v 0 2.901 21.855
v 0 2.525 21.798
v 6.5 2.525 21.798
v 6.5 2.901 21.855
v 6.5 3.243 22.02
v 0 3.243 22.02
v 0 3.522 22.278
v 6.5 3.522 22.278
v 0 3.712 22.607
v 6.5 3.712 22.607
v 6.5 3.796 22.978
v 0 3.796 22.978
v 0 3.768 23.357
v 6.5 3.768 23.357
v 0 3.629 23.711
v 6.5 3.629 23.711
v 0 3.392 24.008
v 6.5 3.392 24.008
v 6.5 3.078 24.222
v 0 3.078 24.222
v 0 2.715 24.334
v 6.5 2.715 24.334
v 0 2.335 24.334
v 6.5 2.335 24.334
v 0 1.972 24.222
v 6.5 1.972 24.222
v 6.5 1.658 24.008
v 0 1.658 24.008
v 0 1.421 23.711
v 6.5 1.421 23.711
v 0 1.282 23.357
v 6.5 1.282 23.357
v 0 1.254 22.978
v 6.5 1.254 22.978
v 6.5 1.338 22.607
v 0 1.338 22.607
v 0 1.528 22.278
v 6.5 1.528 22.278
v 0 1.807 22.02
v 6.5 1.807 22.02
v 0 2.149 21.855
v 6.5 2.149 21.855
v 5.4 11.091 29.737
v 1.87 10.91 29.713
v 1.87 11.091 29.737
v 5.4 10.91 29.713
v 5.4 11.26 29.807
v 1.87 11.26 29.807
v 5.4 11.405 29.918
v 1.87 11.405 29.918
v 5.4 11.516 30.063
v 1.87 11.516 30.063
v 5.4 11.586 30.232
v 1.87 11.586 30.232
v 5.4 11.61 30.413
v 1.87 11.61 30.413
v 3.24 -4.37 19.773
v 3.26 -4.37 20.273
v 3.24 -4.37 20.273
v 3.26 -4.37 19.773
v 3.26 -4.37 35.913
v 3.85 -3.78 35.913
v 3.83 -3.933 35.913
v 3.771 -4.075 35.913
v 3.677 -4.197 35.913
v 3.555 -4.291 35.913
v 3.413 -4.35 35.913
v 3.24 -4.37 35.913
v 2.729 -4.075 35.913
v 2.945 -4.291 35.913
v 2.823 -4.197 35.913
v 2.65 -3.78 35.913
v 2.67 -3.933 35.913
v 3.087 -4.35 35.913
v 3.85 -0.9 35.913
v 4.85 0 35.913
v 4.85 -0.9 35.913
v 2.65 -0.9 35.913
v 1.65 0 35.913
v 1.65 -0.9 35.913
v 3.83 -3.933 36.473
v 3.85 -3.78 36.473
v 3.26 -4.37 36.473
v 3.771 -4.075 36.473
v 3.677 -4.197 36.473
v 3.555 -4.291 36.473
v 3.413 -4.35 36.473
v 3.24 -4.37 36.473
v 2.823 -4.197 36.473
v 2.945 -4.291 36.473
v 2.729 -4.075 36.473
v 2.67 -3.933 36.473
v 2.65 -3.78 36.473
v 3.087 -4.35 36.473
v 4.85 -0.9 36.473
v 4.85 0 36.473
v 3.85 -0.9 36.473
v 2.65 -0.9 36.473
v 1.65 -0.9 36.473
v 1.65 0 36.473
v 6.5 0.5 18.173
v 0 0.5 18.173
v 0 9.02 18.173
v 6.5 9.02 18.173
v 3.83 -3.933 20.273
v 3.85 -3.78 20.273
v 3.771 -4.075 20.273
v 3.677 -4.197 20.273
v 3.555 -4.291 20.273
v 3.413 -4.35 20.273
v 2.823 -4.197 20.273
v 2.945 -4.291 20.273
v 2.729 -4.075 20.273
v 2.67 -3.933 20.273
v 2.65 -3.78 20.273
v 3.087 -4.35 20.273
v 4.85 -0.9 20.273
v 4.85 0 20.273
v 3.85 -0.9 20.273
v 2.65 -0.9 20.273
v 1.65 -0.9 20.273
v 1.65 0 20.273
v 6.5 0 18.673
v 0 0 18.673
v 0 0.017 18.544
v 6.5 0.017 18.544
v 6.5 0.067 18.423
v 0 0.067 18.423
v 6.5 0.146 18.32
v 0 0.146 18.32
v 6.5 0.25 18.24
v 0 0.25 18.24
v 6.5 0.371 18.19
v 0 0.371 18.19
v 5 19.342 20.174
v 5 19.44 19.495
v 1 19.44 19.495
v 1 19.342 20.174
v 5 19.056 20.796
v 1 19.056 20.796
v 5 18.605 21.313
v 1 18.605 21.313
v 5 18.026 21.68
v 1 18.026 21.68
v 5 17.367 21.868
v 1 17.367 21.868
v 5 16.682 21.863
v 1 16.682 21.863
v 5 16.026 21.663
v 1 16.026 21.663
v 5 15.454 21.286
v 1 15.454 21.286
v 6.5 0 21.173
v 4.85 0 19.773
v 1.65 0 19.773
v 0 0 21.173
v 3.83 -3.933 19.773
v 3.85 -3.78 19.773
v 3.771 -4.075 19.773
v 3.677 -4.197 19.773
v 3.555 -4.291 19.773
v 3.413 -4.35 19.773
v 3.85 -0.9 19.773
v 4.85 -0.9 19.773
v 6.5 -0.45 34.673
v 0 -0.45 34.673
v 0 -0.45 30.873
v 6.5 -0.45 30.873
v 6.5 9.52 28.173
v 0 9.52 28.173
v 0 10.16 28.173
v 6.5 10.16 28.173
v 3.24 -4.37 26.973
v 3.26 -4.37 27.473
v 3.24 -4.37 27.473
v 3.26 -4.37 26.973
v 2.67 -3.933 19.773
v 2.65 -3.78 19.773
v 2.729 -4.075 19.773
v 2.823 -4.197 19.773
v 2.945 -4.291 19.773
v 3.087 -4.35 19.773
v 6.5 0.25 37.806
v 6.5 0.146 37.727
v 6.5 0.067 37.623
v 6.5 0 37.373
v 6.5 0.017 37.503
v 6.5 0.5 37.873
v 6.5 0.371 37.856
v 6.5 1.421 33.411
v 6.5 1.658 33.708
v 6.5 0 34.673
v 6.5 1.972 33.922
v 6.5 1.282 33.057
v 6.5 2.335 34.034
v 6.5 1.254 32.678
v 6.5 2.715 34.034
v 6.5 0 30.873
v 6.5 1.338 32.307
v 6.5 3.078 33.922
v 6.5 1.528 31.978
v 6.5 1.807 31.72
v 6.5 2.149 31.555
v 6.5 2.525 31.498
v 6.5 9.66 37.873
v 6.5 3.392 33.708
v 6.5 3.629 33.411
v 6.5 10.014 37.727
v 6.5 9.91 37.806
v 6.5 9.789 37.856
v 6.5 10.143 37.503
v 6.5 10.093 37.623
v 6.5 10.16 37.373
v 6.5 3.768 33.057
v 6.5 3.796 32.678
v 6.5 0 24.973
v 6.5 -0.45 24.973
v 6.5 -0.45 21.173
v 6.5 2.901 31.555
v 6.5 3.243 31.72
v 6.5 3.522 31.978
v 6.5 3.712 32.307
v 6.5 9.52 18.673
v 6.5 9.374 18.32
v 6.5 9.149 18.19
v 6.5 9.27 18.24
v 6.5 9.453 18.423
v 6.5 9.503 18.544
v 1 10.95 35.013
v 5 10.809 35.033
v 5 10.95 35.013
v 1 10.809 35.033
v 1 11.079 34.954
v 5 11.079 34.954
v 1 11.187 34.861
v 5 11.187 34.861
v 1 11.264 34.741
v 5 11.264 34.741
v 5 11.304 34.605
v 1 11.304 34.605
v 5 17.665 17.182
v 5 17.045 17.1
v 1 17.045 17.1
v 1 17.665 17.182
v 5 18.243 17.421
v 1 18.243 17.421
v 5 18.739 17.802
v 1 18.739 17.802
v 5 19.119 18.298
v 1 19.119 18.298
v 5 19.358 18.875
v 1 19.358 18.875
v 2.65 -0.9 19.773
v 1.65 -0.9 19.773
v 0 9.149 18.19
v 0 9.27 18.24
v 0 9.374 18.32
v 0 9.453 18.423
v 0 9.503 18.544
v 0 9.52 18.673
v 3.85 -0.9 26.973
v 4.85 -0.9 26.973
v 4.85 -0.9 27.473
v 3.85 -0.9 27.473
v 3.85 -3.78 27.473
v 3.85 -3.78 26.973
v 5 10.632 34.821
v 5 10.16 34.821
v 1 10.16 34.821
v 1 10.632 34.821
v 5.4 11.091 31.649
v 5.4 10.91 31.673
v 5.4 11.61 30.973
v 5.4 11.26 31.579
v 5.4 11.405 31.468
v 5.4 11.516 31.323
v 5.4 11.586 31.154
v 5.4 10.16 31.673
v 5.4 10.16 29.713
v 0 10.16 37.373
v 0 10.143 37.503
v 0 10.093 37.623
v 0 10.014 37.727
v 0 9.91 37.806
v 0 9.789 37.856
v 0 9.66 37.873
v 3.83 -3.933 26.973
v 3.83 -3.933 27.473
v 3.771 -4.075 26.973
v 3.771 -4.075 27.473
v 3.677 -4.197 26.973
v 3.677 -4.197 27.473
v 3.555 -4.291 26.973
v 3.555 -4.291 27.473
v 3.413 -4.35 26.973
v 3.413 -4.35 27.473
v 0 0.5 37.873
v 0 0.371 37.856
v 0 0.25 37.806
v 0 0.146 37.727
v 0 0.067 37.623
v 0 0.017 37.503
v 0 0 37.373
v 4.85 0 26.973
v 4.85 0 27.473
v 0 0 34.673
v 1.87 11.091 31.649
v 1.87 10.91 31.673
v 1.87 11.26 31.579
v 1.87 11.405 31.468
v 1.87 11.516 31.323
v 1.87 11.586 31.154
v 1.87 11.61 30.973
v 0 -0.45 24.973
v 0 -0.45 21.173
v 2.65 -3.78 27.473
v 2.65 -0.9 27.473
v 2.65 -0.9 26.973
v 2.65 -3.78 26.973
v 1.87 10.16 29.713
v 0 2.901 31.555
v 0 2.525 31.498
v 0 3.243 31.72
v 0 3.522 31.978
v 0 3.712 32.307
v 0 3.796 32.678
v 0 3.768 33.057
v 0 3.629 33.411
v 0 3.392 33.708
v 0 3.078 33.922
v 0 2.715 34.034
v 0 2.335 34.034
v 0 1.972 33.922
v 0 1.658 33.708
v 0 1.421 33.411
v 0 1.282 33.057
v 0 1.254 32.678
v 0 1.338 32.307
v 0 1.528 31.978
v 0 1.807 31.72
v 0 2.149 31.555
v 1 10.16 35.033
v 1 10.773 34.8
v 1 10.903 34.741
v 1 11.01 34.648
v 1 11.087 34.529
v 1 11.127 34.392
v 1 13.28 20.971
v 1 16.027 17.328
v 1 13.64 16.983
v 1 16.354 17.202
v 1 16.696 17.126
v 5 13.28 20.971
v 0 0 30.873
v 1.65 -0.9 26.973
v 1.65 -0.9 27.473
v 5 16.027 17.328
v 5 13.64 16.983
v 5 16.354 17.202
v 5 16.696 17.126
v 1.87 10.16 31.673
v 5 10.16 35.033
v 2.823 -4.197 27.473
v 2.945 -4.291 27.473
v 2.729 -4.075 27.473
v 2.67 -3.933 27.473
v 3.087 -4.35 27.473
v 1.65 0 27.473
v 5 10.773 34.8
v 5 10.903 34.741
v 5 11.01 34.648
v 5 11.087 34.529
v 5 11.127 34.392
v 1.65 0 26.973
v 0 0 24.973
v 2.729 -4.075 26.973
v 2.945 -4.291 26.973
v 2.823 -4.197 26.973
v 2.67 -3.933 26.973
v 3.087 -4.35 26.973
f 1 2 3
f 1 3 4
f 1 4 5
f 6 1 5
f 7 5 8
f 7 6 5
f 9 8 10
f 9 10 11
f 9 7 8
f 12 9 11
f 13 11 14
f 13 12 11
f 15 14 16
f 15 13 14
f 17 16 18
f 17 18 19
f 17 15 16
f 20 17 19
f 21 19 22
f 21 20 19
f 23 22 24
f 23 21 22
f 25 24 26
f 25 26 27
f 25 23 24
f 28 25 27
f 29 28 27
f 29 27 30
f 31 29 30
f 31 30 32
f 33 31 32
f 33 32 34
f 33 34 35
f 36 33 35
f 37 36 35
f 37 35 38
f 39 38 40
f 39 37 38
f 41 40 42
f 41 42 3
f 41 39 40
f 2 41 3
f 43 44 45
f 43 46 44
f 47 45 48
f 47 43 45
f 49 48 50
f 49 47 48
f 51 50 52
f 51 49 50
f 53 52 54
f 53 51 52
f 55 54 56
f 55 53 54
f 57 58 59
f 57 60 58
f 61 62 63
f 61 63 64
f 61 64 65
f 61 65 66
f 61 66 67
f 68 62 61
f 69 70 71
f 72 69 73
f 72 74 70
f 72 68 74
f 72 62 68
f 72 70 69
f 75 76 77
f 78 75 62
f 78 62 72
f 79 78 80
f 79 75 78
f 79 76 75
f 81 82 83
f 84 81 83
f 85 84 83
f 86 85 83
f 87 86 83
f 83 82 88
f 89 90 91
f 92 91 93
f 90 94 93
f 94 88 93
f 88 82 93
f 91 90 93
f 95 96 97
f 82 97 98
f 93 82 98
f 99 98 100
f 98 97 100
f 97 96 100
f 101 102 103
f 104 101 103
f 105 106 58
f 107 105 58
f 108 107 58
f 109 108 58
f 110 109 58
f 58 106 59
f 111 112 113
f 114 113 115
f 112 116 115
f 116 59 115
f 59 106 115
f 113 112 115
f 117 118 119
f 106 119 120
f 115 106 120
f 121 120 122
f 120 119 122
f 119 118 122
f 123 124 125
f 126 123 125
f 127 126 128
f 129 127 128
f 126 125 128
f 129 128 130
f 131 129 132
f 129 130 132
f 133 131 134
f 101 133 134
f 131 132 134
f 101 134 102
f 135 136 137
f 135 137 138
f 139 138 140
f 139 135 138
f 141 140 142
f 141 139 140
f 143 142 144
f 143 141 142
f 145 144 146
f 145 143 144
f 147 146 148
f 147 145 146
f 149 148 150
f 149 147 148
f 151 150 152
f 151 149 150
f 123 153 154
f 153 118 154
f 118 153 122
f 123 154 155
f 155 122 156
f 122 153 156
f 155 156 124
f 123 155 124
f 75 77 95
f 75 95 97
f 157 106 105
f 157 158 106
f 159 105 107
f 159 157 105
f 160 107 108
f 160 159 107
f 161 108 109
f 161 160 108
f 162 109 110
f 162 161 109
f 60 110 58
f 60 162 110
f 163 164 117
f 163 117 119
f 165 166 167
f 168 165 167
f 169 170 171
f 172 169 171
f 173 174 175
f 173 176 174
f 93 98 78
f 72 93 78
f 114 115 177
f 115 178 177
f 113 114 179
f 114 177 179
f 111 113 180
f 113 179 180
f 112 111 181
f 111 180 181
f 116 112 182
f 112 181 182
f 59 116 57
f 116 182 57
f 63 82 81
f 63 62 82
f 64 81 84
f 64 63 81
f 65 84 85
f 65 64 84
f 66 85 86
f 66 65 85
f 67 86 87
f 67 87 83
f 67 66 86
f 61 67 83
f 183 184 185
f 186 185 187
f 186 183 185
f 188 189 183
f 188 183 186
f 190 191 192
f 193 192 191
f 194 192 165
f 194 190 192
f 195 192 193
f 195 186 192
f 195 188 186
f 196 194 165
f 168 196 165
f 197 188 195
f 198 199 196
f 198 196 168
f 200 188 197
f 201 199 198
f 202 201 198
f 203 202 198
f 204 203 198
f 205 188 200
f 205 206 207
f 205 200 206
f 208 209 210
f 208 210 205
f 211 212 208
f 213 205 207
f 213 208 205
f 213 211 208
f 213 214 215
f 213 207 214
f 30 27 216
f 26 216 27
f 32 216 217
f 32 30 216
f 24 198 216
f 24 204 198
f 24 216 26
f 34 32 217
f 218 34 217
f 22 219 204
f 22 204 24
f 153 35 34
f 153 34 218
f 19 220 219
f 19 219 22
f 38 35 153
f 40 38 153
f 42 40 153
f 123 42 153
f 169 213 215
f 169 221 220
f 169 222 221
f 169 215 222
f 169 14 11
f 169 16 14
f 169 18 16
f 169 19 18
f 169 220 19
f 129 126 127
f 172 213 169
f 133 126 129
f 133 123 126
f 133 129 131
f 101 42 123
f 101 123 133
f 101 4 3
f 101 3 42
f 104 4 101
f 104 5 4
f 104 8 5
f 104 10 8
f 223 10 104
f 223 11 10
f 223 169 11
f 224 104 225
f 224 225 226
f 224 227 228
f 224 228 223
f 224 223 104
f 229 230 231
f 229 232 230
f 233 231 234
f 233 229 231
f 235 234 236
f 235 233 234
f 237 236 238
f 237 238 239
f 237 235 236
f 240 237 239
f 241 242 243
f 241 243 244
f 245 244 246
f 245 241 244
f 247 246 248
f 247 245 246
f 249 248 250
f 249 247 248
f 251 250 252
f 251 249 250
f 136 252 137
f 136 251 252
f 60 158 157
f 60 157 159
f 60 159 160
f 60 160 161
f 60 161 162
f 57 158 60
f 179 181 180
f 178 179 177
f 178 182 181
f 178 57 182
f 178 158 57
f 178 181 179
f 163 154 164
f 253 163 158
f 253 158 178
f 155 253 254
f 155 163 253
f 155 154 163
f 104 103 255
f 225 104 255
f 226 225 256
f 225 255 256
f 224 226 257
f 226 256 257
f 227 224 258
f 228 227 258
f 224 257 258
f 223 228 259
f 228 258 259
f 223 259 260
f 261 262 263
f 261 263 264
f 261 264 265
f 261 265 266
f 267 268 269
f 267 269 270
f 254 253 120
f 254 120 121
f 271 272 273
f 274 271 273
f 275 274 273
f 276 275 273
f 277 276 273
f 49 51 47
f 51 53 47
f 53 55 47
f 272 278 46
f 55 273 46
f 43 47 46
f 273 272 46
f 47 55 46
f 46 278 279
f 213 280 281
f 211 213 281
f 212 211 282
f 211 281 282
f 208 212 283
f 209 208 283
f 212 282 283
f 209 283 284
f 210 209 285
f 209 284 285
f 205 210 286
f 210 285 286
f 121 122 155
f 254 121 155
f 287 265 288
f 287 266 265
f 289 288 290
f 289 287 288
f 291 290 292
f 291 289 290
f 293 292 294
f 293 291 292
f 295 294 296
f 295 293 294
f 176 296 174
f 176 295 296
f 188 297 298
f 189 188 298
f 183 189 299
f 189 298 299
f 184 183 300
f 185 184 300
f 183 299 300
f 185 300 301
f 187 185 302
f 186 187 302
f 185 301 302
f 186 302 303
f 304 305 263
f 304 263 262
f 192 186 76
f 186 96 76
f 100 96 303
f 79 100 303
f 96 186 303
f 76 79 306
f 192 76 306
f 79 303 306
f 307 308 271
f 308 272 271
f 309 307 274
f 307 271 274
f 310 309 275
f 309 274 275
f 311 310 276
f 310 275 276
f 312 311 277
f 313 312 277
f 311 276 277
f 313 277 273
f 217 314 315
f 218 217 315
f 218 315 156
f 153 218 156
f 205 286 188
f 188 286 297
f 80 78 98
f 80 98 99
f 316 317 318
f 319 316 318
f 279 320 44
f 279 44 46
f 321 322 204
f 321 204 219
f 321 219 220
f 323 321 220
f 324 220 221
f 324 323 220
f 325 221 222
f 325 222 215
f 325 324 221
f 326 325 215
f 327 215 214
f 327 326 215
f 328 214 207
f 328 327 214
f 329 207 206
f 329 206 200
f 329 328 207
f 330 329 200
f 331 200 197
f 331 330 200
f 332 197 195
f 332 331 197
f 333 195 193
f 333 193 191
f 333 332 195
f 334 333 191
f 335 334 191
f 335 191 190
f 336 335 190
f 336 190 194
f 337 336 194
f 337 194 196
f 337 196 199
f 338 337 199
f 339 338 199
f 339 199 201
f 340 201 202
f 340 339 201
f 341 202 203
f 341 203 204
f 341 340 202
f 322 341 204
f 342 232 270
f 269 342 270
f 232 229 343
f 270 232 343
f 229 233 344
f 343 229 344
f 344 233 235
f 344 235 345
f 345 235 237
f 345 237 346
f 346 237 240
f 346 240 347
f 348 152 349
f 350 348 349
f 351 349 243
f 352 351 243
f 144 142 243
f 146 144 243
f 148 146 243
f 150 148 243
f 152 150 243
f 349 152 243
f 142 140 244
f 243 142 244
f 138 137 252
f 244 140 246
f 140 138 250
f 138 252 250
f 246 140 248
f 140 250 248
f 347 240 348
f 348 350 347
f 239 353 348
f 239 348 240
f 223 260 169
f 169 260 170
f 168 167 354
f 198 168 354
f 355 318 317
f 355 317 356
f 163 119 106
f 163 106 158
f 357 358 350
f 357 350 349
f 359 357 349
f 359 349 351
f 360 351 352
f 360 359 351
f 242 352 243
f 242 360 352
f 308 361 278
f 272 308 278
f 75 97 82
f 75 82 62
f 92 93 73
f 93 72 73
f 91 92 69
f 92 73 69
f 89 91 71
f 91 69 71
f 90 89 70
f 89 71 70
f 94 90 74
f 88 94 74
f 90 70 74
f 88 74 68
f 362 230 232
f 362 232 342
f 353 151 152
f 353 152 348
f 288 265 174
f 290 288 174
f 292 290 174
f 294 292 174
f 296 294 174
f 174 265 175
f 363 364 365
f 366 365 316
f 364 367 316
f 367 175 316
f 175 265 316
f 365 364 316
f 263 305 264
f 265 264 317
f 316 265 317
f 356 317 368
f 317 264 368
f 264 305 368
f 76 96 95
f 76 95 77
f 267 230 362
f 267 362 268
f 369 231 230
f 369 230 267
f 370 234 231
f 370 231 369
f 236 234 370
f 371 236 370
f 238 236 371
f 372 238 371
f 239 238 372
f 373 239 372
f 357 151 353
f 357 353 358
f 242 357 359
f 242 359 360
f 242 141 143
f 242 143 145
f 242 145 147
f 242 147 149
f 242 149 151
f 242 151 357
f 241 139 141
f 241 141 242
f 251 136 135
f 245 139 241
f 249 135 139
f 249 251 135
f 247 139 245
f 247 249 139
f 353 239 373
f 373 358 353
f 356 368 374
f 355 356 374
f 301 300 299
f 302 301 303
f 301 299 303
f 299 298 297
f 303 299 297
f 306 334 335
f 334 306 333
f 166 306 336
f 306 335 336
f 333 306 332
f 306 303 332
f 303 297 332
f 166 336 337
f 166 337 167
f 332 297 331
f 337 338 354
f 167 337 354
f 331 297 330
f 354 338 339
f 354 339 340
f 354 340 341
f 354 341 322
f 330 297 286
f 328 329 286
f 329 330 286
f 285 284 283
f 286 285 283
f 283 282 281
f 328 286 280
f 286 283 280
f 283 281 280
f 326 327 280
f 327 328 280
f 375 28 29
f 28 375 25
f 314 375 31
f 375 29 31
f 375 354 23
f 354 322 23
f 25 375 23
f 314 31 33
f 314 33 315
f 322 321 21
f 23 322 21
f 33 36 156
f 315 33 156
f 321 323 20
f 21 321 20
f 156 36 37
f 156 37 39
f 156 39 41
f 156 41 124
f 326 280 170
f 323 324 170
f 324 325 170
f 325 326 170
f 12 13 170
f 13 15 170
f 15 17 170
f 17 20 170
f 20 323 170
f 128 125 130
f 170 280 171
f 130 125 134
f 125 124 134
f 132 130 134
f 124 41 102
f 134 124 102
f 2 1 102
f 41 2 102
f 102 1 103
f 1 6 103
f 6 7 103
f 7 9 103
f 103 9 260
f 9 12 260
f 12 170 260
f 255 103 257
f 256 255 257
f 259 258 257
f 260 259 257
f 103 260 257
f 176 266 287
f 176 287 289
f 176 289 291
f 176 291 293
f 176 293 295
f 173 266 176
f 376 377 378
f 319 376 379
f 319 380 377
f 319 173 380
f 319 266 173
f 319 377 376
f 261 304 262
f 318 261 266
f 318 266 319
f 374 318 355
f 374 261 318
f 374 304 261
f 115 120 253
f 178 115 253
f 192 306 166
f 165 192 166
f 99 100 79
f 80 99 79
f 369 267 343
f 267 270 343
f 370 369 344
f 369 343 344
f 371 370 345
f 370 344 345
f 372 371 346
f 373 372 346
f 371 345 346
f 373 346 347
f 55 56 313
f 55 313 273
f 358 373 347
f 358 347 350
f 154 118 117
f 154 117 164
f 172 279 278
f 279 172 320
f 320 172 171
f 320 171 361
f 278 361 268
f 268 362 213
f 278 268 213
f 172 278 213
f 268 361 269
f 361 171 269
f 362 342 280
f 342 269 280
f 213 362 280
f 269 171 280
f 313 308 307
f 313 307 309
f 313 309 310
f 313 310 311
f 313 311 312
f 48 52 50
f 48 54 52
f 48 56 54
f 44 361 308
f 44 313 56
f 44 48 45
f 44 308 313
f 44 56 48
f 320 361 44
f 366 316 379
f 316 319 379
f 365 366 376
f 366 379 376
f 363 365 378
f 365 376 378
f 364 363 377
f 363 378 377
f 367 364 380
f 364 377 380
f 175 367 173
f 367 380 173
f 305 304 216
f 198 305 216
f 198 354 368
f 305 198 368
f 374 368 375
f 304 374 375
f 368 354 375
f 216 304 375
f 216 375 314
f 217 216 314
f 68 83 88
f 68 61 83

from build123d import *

# Parameters (mm, degrees)
SKETCH1_R           = 1.275
BOSS_EXTRUDE1_DEPTH = 6.5
SKETCH2_W           = 3.53
SKETCH2_H           = 1.96
BOSS_EXTRUDE2_DEPTH = 1.45
FILLET1_R           = 0.7
SKETCH3_W           = 3.2
SKETCH3_H           = 0.56
SKETCH3_H_2         = 0.5
BOSS_EXTRUDE3_DEPTH = 0.9
SKETCH4_W           = 1.2
SKETCH4_H           = 0.56
SKETCH4_H_2         = 0.5
BOSS_EXTRUDE4_DEPTH = 3.47
FILLET2_R           = 0.59
EXTRUDE_START       = -1.5
EXTRUDE_1_DEPTH     = 4
FILLET_1_R          = 0.5


with BuildPart() as part:
    # Sketch1 → Boss-Extrude1 (new body)
    with BuildSketch(Plane(origin=(0, 0, 0), x_dir=(0, 0, -1), z_dir=(1, 0, 0))):
        with BuildLine():
            Line((-37.373122581, 0), (-34.673122581, 0))
            Line((-34.673122581, 0), (-34.673122581, -0.45))
            Line((-34.673122581, -0.45), (-30.873122581, -0.45))
            Line((-30.873122581, -0.45), (-30.873122581, 0))
            Line((-30.873122581, 0), (-24.973122581, 0))
            Line((-24.973122581, 0), (-24.973122581, -0.45))
            Line((-24.973122581, -0.45), (-21.173122581, -0.45))
            Line((-21.173122581, -0.45), (-21.173122581, 0))
            Line((-21.173122581, 0), (-18.673122581, 0))
            ThreePointArc((-18.673122581, 0), (-18.31956919, 0.146446609), (-18.173122581, 0.5))
            Line((-18.173122581, 0.5), (-18.173122581, 9.02))
            ThreePointArc((-18.173122581, 9.02), (-18.31956919, 9.373553391), (-18.673122581, 9.52))
            Line((-18.673122581, 9.52), (-28.173122581, 9.52))
            Line((-28.173122581, 9.52), (-28.173122581, 10.16))
            Line((-28.173122581, 10.16), (-37.373122581, 10.16))
            ThreePointArc((-37.373122581, 10.16), (-37.726675972, 10.013553391), (-37.873122581, 9.66))
            Line((-37.873122581, 9.66), (-37.873122581, 0.5))
            ThreePointArc((-37.873122581, 0.5), (-37.726675972, 0.146446609), (-37.373122581, 0))
        make_face()
        with Locations((-32.773122581, 2.525)):
            Circle(SKETCH1_R, mode=Mode.SUBTRACT)
        with Locations((-23.073122581, 2.525)):
            Circle(SKETCH1_R, mode=Mode.SUBTRACT)
    extrude(amount=BOSS_EXTRUDE1_DEPTH)

    # Sketch2 → Boss-Extrude2 (add)
    with BuildSketch(Plane(origin=(0, 10.16, 0), x_dir=(1, 0, 0), z_dir=(0, 1, 0))):
        with Locations((3.635, -30.693122581)):
            Rectangle(SKETCH2_W, SKETCH2_H)
    extrude(amount=BOSS_EXTRUDE2_DEPTH)

    # Fillet1
    fillet1_edges = [part.edges().sort_by_distance(p)[0] for p in [
        (3.635, 11.61, 31.673122581),
        (3.635, 11.61, 29.713122581),
    ]]
    fillet(fillet1_edges, radius=FILLET1_R)

    # Sketch3 → Boss-Extrude3 (add)
    with BuildSketch(Plane(origin=(0, 0, 0), x_dir=(-1, 0, 0), z_dir=(0, -1, 0))):
        with Locations((-3.25, -36.193122581)):
            Rectangle(SKETCH3_W, SKETCH3_H)
        with Locations((-3.25, -27.223122581)):
            Rectangle(SKETCH3_W, SKETCH3_H_2)
        with Locations((-3.25, -20.023122581)):
            Rectangle(SKETCH3_W, SKETCH3_H_2)
    extrude(amount=BOSS_EXTRUDE3_DEPTH)

    # Sketch4 → Boss-Extrude4 (add)
    with BuildSketch(Plane(origin=(0, -0.9, 0), x_dir=(-1, 0, 0), z_dir=(0, -1, 0))):
        with Locations((-3.25, -36.193122581)):
            Rectangle(SKETCH4_W, SKETCH4_H)
        with Locations((-3.25, -27.223122581)):
            Rectangle(SKETCH4_W, SKETCH4_H_2)
        with Locations((-3.25, -20.023122581)):
            Rectangle(SKETCH4_W, SKETCH4_H_2)
    extrude(amount=BOSS_EXTRUDE4_DEPTH)

    # Fillet2
    fillet2_edges = [part.edges().sort_by_distance(p)[0] for p in [
        (2.65, -4.37, 36.193122581),
        (3.85, -4.37, 36.193122581),
        (2.65, -4.37, 27.223122581),
        (3.85, -4.37, 27.223122581),
        (3.85, -4.37, 20.023122581),
        (2.65, -4.37, 20.023122581),
    ]]
    fillet(fillet2_edges, radius=FILLET2_R)

    # Эскиз1 → Бобышка-Вытянуть1 (add)
    with BuildSketch(Plane(origin=(6.5, 0, 0), x_dir=(0, 0, -1), z_dir=(1, 0, 0)).offset(EXTRUDE_START)):
        with BuildLine():
            Line((-35.033122581, 10.16), (-34.820611294, 10.16))
            Line((-34.820611294, 10.16), (-34.820611294, 11.065475419))
            Line((-34.820611294, 11.065475419), (-16.983122581, 13.639958326))
            Line((-16.983122581, 13.639958326), (-17.327590515, 16.026629013))
            ThreePointArc((-17.327590515, 16.026629013), (-19.152479599, 14.674662016), (-21.2856409, 15.454186098))
            Line((-21.2856409, 15.454186098), (-20.970513986, 13.279774136))
            Line((-20.970513986, 13.279774136), (-35.033122581, 11.241748905))
            Line((-35.033122581, 11.241748905), (-35.033122581, 10.16))
        make_face()
        with BuildLine():
            ThreePointArc((-21.2856409, 15.454186098), (-19.152479599, 14.674662016), (-17.327590515, 16.026629013))
            Line((-17.327590515, 16.026629013), (-17.515806862, 17.330699412))
            ThreePointArc((-17.515806862, 17.330699412), (-19.781572094, 19.024405415), (-21.474617523, 16.75814654))
            Line((-21.474617523, 16.75814654), (-21.2856409, 15.454186098))
        make_face()
        with BuildLine():
            Line((-17.515806862, 17.330699412), (-17.327590515, 16.026629013))
            ThreePointArc((-17.327590515, 16.026629013), (-17.157809946, 16.523285896), (-17.100295646, 17.045))
            ThreePointArc((-17.100295646, 17.045), (-17.801774905, 18.738520741), (-19.495295646, 19.44))
            ThreePointArc((-19.495295646, 19.44), (-21.680018087, 18.026332182), (-21.2856409, 15.454186098))
            Line((-21.2856409, 15.454186098), (-21.474617523, 16.75814654))
            ThreePointArc((-21.474617523, 16.75814654), (-19.781572094, 19.024405415), (-17.515806862, 17.330699412))
        make_face()
    extrude(amount=-EXTRUDE_1_DEPTH)

    # Скругление1
    fillet_1_edges = [part.edges().sort_by_distance(p)[0] for p in [
        (3, 11.065475419, 34.820611294),
        (3, 11.241748905, 35.033122581),
    ]]
    fillet(fillet_1_edges, radius=FILLET_1_R)


solid = part.part
